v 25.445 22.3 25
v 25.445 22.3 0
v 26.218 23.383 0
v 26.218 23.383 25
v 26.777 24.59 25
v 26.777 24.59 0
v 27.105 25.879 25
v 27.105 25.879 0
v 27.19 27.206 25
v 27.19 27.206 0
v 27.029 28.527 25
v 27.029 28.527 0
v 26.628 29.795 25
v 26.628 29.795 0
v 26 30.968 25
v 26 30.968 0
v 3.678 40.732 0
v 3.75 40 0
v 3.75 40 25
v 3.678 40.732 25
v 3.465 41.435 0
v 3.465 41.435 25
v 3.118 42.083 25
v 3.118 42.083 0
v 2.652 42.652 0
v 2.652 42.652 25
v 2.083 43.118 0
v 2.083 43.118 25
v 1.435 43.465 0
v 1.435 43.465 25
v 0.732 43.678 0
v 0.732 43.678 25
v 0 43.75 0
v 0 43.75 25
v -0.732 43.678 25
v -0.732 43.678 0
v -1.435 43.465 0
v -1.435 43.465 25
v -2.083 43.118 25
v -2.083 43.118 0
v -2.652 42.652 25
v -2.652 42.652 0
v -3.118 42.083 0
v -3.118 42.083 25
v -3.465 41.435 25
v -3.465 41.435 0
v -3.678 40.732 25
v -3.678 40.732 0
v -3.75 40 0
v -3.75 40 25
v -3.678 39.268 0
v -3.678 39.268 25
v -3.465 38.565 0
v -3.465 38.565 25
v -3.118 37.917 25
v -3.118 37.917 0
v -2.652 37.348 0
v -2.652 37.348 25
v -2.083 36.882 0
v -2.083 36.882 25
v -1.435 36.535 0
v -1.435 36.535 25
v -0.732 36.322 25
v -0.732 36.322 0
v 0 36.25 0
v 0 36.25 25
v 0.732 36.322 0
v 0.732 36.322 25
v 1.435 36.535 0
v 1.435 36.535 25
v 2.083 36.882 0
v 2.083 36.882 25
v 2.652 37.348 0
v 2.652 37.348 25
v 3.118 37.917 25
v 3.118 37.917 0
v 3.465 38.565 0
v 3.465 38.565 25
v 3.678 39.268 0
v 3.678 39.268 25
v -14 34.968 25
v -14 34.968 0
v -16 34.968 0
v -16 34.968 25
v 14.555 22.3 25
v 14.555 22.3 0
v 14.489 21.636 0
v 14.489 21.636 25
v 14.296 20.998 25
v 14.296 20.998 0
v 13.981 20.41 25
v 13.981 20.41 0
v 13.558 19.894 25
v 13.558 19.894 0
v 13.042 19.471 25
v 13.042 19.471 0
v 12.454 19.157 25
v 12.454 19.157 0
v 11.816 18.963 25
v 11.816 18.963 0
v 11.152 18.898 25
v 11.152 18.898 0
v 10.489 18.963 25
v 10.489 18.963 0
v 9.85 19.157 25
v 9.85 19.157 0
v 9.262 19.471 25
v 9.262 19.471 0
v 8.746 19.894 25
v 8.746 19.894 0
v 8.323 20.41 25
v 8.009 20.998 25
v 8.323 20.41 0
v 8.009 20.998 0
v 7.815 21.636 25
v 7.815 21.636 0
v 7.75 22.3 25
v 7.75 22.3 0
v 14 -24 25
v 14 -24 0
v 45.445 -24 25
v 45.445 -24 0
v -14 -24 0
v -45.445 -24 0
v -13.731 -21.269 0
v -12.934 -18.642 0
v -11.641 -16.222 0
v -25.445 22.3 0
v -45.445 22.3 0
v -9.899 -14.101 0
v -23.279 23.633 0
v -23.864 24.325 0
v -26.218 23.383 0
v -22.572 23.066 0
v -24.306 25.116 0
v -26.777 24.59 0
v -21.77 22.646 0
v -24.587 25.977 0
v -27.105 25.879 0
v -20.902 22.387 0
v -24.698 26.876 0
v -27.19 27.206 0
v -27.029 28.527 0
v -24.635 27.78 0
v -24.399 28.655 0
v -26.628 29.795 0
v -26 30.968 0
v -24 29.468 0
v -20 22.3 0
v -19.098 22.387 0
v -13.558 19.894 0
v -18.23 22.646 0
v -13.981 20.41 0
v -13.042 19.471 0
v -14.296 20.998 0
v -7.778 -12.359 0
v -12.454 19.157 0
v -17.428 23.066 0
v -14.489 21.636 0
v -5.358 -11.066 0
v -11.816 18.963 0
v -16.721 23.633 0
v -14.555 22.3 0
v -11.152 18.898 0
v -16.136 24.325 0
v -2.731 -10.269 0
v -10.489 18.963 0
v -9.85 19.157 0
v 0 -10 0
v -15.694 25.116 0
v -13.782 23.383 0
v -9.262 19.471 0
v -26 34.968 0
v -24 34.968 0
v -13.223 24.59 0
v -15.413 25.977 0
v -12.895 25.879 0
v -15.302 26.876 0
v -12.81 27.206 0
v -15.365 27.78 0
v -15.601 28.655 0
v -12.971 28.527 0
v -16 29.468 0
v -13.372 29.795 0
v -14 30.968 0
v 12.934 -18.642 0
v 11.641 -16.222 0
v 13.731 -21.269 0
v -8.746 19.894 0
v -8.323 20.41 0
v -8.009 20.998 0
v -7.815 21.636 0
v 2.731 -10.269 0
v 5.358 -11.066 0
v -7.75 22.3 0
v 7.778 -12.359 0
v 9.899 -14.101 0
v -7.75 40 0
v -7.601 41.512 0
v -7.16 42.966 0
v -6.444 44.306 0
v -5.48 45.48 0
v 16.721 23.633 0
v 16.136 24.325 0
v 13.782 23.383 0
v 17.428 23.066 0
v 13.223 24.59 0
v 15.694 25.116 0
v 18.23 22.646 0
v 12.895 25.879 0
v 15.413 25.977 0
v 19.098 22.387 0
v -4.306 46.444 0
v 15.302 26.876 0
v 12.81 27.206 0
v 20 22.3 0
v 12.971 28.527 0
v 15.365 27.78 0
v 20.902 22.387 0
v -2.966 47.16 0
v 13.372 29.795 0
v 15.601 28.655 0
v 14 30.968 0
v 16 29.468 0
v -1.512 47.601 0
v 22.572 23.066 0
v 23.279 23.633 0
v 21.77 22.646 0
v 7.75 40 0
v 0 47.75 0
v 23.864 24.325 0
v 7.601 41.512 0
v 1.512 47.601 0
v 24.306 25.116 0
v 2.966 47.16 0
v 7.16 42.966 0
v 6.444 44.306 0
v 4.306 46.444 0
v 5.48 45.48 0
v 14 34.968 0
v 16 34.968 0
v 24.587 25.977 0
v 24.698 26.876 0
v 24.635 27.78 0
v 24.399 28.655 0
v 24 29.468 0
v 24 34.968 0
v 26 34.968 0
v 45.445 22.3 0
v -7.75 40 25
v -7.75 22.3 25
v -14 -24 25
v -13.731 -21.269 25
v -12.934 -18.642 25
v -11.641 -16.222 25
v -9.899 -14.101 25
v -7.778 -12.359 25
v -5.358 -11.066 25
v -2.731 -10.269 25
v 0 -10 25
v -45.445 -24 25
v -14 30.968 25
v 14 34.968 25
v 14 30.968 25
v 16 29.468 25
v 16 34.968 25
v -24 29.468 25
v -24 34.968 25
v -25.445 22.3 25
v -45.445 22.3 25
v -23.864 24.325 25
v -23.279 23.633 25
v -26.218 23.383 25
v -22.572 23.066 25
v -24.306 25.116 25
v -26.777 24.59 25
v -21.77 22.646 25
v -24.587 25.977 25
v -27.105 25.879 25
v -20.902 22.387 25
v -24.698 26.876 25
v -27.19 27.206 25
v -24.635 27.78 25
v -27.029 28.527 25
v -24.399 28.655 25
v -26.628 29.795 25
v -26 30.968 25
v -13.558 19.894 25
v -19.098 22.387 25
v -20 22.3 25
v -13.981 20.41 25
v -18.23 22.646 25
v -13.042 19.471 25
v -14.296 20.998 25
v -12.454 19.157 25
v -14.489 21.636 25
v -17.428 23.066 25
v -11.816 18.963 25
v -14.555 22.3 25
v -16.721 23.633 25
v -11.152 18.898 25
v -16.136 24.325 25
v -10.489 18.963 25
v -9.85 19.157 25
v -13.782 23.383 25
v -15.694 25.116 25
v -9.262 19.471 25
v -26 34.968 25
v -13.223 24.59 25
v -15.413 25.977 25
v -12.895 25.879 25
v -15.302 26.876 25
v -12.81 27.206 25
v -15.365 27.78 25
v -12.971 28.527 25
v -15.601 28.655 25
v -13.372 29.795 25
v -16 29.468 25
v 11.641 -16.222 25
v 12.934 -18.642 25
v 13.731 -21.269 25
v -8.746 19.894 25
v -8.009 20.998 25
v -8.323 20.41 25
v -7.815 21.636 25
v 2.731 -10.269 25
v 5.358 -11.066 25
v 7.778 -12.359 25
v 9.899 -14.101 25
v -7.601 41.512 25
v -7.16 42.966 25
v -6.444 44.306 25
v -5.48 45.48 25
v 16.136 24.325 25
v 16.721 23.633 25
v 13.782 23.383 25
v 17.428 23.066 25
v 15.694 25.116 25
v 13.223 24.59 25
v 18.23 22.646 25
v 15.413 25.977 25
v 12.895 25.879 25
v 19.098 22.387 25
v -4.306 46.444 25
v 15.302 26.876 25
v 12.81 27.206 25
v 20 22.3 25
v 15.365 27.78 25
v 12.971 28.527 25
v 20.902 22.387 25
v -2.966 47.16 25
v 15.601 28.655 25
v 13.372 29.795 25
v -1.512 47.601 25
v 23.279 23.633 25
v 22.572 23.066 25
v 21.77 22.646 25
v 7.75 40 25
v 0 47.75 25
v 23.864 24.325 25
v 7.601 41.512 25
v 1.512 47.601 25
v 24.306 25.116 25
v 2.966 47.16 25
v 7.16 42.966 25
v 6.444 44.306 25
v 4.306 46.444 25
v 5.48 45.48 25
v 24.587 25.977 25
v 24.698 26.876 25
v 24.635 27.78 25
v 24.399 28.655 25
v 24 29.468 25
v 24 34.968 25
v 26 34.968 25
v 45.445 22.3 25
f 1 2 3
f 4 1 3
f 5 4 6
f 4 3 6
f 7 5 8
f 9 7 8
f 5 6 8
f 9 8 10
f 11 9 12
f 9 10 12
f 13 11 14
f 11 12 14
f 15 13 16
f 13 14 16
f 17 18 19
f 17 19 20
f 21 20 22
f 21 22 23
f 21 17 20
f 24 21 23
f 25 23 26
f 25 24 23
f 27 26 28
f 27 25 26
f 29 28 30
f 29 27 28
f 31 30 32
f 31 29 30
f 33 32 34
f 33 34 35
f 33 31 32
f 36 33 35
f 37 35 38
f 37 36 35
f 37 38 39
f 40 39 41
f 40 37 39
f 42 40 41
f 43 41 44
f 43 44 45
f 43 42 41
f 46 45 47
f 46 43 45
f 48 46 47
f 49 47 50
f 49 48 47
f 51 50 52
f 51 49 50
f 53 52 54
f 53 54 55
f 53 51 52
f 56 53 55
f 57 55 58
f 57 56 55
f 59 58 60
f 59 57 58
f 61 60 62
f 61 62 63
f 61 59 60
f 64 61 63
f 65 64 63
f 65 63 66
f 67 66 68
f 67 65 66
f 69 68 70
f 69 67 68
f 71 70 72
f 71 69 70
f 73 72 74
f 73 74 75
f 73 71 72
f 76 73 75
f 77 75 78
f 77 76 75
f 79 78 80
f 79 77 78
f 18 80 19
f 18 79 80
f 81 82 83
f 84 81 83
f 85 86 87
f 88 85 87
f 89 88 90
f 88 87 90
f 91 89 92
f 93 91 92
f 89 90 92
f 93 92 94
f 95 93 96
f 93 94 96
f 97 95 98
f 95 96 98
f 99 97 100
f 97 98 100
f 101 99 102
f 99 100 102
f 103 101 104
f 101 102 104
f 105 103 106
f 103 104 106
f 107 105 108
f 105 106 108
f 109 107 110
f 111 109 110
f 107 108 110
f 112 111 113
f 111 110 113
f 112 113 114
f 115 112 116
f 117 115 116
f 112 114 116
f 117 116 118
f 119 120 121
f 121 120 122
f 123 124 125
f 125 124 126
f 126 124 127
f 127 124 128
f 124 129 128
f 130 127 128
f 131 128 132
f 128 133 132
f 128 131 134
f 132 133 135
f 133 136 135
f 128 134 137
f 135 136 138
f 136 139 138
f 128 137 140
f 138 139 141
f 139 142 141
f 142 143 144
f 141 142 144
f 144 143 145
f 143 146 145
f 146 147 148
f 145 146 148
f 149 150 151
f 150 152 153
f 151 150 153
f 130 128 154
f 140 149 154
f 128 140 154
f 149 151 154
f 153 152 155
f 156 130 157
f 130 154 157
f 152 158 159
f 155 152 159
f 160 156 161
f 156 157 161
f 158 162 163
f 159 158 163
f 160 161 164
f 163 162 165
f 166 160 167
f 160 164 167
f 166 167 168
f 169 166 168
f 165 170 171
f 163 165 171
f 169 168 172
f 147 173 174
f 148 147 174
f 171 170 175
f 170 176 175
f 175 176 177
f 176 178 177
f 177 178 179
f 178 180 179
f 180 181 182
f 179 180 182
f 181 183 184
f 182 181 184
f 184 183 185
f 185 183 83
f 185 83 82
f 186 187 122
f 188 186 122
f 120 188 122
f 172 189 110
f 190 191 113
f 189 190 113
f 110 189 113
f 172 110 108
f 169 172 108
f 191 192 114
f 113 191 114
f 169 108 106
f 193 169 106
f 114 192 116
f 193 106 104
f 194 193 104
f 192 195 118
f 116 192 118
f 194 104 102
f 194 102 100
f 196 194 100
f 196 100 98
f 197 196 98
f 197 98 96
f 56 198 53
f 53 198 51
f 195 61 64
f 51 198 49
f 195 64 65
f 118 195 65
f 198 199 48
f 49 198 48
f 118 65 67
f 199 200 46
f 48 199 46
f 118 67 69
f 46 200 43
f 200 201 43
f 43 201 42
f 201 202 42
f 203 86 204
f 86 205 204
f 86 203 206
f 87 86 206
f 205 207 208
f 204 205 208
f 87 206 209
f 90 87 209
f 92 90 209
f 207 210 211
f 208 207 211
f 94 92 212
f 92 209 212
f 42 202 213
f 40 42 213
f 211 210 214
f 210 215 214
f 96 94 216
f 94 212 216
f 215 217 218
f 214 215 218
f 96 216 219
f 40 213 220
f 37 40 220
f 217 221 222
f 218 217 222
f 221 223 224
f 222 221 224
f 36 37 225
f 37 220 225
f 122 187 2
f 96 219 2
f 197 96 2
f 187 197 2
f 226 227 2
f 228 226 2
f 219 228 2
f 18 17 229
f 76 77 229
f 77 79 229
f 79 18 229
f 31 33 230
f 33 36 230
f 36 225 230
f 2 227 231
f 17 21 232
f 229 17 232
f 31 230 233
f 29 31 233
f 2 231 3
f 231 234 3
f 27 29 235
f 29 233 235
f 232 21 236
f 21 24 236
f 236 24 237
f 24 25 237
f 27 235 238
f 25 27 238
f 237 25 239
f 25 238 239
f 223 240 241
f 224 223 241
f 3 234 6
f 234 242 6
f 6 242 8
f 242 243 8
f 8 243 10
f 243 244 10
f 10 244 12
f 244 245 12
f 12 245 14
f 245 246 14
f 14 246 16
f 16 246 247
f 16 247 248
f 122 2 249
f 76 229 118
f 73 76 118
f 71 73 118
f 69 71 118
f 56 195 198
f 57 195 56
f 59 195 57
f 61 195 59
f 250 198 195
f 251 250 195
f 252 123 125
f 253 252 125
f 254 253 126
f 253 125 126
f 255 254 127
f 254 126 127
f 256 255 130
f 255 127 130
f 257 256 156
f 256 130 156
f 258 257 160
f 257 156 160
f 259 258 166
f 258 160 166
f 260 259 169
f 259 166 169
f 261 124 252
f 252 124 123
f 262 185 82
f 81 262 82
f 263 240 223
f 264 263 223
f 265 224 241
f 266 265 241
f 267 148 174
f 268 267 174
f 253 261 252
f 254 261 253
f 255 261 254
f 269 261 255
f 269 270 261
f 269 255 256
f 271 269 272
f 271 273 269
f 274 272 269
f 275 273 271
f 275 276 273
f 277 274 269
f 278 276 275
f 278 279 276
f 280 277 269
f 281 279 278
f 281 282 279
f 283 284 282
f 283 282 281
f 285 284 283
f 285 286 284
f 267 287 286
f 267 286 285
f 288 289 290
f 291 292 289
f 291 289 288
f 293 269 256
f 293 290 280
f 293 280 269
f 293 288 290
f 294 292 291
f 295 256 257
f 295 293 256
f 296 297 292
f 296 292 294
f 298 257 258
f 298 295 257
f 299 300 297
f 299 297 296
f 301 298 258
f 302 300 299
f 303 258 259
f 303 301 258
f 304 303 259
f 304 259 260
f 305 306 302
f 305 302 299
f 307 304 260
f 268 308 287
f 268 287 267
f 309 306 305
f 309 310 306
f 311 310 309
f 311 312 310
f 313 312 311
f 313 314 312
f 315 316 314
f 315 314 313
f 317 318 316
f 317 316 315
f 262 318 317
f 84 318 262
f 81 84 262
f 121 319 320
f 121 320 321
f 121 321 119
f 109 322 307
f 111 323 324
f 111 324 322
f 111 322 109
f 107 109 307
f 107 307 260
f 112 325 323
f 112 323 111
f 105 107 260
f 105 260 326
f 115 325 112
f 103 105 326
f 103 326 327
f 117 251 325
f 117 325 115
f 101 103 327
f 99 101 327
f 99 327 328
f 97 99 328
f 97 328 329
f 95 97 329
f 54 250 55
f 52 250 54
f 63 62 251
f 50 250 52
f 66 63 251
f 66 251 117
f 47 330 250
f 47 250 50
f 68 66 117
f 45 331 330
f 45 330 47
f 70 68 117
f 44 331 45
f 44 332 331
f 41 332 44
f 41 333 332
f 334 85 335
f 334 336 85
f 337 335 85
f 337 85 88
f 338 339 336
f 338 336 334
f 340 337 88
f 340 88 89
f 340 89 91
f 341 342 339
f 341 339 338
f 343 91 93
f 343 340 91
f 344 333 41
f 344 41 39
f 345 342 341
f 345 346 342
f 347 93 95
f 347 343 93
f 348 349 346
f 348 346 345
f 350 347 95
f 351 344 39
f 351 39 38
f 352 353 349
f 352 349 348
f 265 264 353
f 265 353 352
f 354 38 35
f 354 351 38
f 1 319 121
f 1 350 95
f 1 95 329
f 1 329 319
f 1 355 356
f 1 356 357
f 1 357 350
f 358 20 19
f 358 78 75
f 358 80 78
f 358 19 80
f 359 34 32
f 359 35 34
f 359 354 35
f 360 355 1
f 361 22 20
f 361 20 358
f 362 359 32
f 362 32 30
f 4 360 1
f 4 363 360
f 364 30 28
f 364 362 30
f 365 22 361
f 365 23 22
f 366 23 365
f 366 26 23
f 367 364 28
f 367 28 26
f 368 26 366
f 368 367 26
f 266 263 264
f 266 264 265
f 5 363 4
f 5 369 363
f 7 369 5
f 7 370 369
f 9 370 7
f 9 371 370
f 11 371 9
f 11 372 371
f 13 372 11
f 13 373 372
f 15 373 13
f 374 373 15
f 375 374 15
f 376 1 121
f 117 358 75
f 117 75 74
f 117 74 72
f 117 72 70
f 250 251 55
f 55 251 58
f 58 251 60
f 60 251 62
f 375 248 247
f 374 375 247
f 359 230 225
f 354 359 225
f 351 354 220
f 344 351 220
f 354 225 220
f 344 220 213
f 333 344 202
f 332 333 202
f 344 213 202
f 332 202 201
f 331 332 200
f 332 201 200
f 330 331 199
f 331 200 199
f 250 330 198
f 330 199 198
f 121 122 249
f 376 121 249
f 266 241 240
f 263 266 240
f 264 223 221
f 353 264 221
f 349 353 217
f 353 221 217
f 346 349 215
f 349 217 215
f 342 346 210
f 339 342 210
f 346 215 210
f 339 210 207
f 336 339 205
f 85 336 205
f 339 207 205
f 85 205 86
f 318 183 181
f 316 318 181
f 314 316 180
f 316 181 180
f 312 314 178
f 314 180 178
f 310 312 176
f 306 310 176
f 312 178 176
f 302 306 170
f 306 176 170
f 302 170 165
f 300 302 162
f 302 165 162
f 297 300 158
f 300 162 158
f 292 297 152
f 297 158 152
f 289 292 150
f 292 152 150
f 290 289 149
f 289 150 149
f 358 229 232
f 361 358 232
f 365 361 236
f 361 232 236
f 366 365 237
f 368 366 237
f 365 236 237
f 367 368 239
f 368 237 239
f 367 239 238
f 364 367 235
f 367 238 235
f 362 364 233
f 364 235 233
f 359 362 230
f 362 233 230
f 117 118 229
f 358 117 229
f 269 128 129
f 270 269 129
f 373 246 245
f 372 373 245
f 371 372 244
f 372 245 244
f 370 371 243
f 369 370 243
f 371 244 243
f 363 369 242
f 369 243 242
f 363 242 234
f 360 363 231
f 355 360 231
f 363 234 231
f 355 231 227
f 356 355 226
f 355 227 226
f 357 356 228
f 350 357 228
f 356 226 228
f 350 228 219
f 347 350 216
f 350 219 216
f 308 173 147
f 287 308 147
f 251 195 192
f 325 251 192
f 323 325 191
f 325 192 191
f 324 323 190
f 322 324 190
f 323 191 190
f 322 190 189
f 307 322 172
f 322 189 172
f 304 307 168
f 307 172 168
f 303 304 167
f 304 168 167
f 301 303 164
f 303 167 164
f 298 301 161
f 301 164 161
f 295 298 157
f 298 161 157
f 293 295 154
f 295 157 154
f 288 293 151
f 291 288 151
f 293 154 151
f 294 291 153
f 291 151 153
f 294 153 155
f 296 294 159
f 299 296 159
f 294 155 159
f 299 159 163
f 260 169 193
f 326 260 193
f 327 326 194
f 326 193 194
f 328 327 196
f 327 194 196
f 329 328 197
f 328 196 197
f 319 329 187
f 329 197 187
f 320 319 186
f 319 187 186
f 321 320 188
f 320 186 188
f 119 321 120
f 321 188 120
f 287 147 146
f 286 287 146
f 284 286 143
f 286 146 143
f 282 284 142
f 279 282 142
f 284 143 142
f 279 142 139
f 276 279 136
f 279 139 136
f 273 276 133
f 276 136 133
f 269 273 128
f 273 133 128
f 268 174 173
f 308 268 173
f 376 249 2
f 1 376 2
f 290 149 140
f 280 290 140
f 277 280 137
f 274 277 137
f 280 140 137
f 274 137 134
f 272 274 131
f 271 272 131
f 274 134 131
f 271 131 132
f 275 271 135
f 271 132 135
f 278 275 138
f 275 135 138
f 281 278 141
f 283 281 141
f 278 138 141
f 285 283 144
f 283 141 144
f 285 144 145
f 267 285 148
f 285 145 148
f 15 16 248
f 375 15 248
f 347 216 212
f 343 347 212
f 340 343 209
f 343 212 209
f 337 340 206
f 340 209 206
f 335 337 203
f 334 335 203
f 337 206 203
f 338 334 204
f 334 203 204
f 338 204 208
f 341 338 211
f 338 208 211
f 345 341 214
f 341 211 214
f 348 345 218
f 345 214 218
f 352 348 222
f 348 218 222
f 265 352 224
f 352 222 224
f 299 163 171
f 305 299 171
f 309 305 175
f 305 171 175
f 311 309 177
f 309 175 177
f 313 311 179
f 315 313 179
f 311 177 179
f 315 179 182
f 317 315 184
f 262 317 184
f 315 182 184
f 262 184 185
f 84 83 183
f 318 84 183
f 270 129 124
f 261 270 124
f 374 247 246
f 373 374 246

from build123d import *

# Parameters (mm, degrees)
F0_R     = 3.75
F1_DEPTH = 25


with BuildPart() as f1:
    # F0 (on Top) → F1 (new body)
    with BuildSketch(Plane.XY):
        with BuildLine():
            ThreePointArc((-7.75, 22.3), (-11.152254, 18.897746), (-14.554509, 22.3))
            ThreePointArc((-14.554509, 22.3), (-12.821388, 26.540759), (-14, 30.967793))
            Line((-14, 30.967793), (-14, 34.967793))
            Line((-14, 34.967793), (-16, 34.967793))
            Line((-16, 34.967793), (-16, 29.467793))
            ThreePointArc((-16, 29.467793), (-15.895818, 24.709653), (-20, 22.3))
            ThreePointArc((-20, 22.3), (-24.104182, 24.709653), (-24, 29.467793))
            Line((-24, 29.467793), (-24, 34.967793))
            Line((-24, 34.967793), (-26, 34.967793))
            Line((-26, 34.967793), (-26, 30.967793))
            ThreePointArc((-26, 30.967793), (-27.178612, 26.540759), (-25.445491, 22.3))
            Line((-25.445491, 22.3), (-45.445491, 22.3))
            Line((-45.445491, 22.3), (-45.445491, -24))
            Line((-45.445491, -24), (-14, -24))
            ThreePointArc((-14, -24), (-9.899495, -14.100505), (0, -10))
            ThreePointArc((0, -10), (9.899495, -14.100505), (14, -24))
            Line((14, -24), (45.445491, -24))
            Line((45.445491, -24), (45.445491, 22.3))
            Line((45.445491, 22.3), (25.445491, 22.3))
            ThreePointArc((25.445491, 22.3), (27.178612, 26.540759), (26, 30.967793))
            Line((26, 30.967793), (26, 34.967793))
            Line((26, 34.967793), (24, 34.967793))
            Line((24, 34.967793), (24, 29.467793))
            ThreePointArc((24, 29.467793), (24.104182, 24.709653), (20, 22.3))
            ThreePointArc((20, 22.3), (15.895818, 24.709653), (16, 29.467793))
            Line((16, 29.467793), (16, 34.967793))
            Line((16, 34.967793), (14, 34.967793))
            Line((14, 34.967793), (14, 30.967793))
            ThreePointArc((14, 30.967793), (12.821388, 26.540759), (14.554509, 22.3))
            ThreePointArc((14.554509, 22.3), (11.152254, 18.897746), (7.75, 22.3))
            Line((7.75, 22.3), (7.75, 40))
            ThreePointArc((7.75, 40), (5.480078, 45.480078), (0, 47.75))
            ThreePointArc((0, 47.75), (-5.480078, 45.480078), (-7.75, 40))
            Line((-7.75, 40), (-7.75, 22.3))
        make_face()
        with Locations((0, 40)):
            Circle(F0_R, mode=Mode.SUBTRACT)
    extrude(amount=F1_DEPTH)


solid = f1.part
